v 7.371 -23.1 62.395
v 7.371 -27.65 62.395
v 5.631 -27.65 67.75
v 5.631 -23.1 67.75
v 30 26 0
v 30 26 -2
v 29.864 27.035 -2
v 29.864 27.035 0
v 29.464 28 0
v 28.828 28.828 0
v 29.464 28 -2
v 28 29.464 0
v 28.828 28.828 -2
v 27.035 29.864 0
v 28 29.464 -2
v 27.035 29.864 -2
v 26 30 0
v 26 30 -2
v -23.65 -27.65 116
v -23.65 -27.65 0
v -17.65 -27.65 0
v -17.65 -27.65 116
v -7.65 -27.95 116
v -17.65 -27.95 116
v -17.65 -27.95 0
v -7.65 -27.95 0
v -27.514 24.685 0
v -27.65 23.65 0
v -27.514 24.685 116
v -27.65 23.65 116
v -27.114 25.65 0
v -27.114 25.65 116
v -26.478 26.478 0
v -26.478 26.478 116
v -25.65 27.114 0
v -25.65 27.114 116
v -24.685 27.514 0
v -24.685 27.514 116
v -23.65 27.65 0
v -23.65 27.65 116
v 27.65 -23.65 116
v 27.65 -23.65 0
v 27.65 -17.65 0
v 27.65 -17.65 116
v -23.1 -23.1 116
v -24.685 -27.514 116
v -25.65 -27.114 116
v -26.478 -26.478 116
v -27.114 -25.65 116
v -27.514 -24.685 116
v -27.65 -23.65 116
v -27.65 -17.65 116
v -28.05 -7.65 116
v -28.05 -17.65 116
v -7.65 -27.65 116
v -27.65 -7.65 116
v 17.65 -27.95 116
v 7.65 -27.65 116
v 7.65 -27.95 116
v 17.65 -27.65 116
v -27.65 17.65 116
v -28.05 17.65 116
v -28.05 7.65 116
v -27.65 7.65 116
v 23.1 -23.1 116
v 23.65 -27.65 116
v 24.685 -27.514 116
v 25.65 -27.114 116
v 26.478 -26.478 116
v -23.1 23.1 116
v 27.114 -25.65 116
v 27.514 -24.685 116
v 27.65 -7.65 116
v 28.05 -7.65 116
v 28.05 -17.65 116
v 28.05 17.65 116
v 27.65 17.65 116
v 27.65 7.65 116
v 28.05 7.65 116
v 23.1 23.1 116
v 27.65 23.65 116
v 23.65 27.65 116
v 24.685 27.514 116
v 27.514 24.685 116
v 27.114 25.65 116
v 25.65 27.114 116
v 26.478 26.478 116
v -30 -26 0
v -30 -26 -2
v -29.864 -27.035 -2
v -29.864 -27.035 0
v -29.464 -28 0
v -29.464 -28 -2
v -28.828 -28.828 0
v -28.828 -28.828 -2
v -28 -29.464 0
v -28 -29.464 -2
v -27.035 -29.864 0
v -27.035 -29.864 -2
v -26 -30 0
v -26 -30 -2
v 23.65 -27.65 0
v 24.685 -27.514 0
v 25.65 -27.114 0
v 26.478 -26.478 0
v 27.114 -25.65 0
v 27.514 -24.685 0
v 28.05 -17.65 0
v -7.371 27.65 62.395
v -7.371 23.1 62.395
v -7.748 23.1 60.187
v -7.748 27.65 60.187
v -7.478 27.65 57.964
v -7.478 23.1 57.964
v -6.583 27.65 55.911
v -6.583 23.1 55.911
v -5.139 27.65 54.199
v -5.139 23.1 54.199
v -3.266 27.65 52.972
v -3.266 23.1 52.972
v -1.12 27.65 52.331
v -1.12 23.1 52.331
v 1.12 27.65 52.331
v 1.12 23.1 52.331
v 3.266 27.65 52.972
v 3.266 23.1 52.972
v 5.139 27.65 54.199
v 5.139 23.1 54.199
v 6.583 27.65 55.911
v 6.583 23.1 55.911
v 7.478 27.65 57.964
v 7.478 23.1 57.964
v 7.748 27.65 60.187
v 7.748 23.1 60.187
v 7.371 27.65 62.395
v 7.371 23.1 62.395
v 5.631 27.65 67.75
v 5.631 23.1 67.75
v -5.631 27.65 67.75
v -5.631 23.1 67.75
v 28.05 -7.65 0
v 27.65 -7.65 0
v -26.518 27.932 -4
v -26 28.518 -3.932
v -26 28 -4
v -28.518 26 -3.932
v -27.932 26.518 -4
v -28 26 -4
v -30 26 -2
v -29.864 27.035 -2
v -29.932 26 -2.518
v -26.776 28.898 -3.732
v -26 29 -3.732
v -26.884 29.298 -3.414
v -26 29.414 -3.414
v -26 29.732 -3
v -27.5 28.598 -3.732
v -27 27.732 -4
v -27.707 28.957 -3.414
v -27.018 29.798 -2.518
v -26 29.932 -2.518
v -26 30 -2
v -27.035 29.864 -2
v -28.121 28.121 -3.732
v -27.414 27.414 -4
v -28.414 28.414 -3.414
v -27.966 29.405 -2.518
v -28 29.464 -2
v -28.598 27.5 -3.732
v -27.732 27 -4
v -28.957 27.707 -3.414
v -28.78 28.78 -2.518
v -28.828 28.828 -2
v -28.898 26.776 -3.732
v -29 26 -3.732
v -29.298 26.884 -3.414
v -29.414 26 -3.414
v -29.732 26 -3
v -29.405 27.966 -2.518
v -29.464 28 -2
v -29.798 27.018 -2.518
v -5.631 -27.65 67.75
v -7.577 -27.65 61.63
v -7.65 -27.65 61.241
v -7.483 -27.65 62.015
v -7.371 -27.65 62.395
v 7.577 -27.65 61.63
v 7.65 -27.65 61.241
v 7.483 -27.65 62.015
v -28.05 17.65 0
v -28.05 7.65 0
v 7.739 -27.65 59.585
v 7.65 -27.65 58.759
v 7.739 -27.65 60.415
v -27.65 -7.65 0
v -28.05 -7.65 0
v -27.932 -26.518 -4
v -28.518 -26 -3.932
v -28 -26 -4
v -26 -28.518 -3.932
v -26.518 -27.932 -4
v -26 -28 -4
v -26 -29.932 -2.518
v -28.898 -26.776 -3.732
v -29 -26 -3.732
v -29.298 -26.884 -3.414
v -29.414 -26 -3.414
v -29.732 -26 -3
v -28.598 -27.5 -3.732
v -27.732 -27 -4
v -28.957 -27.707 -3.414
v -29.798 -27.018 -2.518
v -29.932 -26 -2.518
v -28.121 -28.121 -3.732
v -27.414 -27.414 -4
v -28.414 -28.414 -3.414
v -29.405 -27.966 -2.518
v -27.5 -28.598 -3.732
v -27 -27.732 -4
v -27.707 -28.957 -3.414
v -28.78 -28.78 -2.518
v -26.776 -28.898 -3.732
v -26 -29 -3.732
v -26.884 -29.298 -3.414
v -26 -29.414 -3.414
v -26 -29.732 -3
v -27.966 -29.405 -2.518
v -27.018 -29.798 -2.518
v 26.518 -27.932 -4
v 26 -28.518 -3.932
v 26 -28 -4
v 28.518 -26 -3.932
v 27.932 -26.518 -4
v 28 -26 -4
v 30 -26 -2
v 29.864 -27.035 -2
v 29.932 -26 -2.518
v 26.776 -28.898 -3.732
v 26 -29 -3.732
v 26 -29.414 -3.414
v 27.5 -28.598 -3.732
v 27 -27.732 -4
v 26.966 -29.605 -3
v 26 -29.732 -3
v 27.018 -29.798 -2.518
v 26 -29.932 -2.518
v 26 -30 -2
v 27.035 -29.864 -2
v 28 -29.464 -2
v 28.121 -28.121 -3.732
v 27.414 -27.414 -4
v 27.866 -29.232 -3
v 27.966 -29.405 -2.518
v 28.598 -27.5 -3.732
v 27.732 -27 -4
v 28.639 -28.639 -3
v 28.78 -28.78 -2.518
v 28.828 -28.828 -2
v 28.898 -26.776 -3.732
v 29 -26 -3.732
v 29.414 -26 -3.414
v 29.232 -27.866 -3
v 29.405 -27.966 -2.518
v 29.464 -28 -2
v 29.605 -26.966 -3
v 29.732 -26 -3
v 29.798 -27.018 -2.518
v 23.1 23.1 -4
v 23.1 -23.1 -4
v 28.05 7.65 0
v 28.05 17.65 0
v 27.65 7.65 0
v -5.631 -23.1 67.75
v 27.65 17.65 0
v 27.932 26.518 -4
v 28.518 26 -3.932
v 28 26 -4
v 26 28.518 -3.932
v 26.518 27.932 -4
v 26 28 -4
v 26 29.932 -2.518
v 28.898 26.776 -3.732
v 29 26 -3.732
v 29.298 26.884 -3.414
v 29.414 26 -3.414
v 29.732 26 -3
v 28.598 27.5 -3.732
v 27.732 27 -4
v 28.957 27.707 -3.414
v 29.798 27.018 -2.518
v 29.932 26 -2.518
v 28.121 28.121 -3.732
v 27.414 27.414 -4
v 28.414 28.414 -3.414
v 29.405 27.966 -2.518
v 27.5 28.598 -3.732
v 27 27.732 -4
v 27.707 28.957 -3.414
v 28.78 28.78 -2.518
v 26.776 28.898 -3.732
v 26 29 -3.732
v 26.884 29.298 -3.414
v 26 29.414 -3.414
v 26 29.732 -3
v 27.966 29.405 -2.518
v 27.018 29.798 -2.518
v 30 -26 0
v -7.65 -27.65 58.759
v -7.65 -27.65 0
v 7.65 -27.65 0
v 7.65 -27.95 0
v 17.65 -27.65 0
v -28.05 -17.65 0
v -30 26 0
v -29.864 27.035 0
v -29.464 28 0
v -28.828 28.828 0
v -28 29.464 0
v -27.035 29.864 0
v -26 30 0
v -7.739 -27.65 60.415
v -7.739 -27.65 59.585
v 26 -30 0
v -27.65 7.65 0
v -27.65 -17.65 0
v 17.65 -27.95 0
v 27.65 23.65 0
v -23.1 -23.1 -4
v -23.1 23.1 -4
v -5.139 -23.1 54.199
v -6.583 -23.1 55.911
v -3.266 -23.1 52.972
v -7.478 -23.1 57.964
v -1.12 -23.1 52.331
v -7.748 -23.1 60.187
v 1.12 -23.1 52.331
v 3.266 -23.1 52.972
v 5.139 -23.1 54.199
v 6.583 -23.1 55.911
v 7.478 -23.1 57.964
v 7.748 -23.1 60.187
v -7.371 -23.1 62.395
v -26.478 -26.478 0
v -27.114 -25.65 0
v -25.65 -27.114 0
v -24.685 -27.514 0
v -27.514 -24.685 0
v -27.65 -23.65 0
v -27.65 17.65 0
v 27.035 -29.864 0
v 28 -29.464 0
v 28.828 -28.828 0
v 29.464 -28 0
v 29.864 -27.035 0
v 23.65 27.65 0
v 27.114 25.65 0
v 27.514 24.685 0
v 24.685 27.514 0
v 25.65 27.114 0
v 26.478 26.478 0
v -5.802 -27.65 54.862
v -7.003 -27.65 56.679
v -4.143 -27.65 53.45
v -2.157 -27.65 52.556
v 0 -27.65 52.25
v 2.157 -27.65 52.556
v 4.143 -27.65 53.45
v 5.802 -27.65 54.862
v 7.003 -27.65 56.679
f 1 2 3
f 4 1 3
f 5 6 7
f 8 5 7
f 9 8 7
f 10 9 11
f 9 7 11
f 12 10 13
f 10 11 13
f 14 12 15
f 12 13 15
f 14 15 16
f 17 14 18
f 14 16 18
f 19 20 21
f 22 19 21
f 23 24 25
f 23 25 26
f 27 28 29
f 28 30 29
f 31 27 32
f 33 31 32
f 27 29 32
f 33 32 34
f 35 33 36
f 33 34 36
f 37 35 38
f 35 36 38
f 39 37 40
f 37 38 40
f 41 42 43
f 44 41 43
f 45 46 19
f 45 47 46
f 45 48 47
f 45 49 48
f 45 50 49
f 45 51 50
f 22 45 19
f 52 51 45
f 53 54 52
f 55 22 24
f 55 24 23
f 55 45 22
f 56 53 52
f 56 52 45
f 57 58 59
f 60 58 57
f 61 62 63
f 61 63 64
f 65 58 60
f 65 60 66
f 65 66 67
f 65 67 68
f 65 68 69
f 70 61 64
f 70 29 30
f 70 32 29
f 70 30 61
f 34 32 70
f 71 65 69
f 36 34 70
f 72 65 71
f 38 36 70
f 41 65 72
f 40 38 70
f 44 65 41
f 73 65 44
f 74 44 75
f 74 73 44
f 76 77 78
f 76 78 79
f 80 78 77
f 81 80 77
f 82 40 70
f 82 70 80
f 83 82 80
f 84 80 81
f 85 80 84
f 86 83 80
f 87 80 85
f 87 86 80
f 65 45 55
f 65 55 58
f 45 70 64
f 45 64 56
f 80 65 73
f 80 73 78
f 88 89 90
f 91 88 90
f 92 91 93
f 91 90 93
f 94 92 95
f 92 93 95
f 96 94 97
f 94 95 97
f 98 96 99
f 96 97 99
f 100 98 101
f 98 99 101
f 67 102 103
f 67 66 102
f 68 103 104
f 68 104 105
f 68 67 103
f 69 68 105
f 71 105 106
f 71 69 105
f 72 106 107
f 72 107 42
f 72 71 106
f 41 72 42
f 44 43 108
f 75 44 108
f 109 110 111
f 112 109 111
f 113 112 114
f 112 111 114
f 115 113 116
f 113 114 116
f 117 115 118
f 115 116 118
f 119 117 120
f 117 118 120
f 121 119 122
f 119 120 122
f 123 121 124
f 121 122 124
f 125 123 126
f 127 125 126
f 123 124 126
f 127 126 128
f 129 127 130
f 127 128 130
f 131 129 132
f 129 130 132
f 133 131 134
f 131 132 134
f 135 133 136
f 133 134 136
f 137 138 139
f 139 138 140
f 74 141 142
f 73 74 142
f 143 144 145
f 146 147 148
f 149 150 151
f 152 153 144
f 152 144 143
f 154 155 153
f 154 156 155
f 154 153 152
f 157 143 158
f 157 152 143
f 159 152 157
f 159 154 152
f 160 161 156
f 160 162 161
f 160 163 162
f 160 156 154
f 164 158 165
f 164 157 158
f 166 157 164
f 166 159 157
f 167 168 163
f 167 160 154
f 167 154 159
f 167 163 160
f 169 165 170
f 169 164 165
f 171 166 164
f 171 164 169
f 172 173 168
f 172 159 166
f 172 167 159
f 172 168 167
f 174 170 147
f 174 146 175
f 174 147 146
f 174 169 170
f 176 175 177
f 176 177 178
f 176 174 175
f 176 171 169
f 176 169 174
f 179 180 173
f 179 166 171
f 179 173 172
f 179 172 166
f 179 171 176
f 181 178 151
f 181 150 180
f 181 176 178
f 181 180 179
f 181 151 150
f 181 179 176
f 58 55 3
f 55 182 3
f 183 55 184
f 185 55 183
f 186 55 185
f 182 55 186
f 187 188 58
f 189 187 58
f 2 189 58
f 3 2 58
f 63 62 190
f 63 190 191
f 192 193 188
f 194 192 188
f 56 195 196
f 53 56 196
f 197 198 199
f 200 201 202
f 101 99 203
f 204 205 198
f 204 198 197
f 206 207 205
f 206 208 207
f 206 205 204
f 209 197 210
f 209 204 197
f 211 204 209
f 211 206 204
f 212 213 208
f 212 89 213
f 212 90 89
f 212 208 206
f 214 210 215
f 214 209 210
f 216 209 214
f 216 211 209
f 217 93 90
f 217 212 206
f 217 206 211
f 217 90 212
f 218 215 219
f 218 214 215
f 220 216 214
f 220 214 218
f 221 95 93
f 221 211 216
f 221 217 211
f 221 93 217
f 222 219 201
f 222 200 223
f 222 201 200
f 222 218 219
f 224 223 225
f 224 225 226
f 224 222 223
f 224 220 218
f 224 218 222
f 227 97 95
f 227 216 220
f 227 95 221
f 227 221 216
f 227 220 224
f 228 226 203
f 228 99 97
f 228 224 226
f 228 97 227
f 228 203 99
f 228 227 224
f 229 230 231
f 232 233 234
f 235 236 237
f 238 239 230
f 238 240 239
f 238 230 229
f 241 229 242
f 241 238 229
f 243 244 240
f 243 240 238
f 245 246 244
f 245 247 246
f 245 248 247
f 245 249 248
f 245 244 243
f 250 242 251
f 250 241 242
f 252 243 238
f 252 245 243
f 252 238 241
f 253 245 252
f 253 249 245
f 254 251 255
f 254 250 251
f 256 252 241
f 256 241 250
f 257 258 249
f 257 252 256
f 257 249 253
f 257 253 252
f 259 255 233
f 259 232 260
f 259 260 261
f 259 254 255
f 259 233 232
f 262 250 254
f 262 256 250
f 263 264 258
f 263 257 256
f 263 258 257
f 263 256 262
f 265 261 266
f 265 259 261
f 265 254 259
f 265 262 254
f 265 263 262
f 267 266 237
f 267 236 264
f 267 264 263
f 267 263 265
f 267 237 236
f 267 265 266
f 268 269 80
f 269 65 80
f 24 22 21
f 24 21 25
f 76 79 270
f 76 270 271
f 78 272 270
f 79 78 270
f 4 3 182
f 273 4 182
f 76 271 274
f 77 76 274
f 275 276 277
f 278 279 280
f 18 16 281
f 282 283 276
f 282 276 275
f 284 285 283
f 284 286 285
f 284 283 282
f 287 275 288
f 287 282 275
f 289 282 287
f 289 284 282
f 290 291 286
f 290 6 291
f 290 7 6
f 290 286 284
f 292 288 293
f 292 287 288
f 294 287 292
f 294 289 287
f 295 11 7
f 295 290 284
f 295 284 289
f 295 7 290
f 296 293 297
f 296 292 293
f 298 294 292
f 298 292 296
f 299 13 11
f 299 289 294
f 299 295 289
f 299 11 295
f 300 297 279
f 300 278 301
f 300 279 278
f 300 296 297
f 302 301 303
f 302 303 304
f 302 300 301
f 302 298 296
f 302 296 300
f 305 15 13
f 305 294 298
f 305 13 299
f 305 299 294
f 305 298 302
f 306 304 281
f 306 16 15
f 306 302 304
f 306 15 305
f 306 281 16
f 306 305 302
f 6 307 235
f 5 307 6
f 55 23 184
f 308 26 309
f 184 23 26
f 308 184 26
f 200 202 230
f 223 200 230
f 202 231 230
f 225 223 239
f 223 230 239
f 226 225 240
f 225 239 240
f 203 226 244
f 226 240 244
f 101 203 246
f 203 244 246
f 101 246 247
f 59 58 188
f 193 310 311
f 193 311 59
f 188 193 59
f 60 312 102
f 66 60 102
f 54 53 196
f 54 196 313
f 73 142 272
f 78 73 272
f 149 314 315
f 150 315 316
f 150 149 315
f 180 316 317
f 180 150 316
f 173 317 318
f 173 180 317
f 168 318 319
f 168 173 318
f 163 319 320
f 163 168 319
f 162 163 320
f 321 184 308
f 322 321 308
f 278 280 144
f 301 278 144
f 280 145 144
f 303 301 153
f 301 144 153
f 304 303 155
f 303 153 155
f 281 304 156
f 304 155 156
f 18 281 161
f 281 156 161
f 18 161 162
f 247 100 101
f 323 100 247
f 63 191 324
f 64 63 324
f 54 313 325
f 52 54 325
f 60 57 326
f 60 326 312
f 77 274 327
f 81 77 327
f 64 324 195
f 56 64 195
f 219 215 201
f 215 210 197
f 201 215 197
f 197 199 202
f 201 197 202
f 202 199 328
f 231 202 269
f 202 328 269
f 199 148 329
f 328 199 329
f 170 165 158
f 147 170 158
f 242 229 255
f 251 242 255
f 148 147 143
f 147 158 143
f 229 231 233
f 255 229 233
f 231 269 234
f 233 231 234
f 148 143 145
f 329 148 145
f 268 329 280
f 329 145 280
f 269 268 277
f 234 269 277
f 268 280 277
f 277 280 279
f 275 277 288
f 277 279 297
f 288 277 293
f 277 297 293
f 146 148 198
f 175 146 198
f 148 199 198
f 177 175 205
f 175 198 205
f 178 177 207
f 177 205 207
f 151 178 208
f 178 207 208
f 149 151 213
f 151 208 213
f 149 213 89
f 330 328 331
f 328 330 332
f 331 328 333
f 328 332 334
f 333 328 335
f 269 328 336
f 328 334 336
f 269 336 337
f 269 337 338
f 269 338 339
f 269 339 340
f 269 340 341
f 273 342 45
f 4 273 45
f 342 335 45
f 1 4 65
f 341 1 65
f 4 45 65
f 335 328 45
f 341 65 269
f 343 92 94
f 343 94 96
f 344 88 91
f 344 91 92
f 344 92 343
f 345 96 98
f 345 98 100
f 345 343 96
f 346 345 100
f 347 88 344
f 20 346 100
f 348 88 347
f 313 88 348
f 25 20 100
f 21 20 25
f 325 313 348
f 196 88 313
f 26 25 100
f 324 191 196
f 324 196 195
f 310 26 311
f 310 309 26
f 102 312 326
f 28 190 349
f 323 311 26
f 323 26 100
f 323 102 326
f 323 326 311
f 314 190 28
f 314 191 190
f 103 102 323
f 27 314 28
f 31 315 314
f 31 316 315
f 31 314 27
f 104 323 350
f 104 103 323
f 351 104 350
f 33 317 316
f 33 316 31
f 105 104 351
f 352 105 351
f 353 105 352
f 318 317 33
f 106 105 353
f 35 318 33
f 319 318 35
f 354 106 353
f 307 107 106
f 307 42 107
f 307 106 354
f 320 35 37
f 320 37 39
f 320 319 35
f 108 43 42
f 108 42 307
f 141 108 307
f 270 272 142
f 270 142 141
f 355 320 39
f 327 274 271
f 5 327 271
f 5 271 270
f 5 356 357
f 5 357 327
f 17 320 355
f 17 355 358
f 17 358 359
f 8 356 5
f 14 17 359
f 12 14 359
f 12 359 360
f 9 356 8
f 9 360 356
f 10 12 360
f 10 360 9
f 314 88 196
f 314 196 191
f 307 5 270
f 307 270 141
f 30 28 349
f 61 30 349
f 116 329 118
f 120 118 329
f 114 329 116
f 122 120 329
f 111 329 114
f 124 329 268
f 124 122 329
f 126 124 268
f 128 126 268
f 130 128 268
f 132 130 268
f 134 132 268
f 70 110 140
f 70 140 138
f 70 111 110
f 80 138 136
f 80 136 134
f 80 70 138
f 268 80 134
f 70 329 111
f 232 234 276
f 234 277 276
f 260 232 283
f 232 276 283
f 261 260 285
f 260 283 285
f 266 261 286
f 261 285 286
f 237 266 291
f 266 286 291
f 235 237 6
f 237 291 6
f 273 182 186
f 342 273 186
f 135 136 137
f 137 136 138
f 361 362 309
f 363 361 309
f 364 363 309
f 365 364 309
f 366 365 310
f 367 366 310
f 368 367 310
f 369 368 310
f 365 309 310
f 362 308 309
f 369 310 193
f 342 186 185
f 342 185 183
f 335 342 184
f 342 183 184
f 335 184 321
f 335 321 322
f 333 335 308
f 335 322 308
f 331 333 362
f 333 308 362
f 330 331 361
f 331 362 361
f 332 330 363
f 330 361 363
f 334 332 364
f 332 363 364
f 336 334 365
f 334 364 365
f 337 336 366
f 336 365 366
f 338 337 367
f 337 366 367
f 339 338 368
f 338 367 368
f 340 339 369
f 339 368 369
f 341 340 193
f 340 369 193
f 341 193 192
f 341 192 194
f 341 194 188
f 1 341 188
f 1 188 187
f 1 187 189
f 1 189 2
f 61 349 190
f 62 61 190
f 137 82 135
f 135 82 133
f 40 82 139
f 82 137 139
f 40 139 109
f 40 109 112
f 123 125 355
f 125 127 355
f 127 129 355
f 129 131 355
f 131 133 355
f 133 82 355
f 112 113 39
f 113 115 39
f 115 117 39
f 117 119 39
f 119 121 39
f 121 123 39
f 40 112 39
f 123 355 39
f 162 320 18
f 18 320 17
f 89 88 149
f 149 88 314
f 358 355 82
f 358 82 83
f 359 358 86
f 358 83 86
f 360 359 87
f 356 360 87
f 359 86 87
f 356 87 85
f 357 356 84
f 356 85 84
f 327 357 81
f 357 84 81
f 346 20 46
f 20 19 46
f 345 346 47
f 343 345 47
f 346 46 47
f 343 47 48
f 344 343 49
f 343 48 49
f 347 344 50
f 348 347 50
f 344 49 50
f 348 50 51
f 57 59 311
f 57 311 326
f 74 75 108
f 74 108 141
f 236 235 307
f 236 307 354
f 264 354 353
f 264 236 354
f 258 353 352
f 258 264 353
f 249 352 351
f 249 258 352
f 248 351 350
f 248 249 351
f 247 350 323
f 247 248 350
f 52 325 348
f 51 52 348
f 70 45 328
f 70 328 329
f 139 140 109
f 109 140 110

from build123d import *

# Parameters (mm, degrees)
F0_W     = 46.2
F0_H     = 46.2
F1_DEPTH = 116
F0_W_2   = 60
F0_H_2   = 60
F2_DEPTH = 4
F3_R     = 4
F4_R     = 2
F7_DEPTH = 80


with BuildPart() as f1:
    # F0 (on Top) → F1 (new body)
    with BuildSketch(Plane.XY):
        Polygon((27.65, 17.65), (27.65, 27.65), (-27.65, 27.65), (-27.65, 17.65), (-28.05, 17.65), (-28.05, 7.65), (-27.65, 7.65), (-27.65, -7.65), (-28.05, -7.65), (-28.05, -17.65), (-27.65, -17.65), (-27.65, -27.65), (-17.65, -27.65), (-17.65, -27.95), (-7.65, -27.95), (-7.65, -27.65), (7.65, -27.65), (7.65, -27.95), (17.65, -27.95), (17.65, -27.65), (27.65, -27.65), (27.65, -17.65), (28.05, -17.65), (28.05, -7.65), (27.65, -7.65), (27.65, 7.65), (28.05, 7.65), (28.05, 17.65), align=None)
        Rectangle(F0_W, F0_H, mode=Mode.SUBTRACT)
    extrude(amount=F1_DEPTH)

    # F0 (on Top) → F2 (join)
    with BuildSketch(Plane.XY):
        Rectangle(F0_W_2, F0_H_2)
        Polygon((-27.65, 27.65), (27.65, 27.65), (27.65, 17.65), (28.05, 17.65), (28.05, 7.65), (27.65, 7.65), (27.65, -7.65), (28.05, -7.65), (28.05, -17.65), (27.65, -17.65), (27.65, -27.65), (17.65, -27.65), (17.65, -27.95), (7.65, -27.95), (7.65, -27.65), (-7.65, -27.65), (-7.65, -27.95), (-17.65, -27.95), (-17.65, -27.65), (-27.65, -27.65), (-27.65, -17.65), (-28.05, -17.65), (-28.05, -7.65), (-27.65, -7.65), (-27.65, 7.65), (-28.05, 7.65), (-28.05, 17.65), (-27.65, 17.65), align=None, mode=Mode.SUBTRACT)
        Polygon((27.65, 17.65), (27.65, 27.65), (-27.65, 27.65), (-27.65, 17.65), (-28.05, 17.65), (-28.05, 7.65), (-27.65, 7.65), (-27.65, -7.65), (-28.05, -7.65), (-28.05, -17.65), (-27.65, -17.65), (-27.65, -27.65), (-17.65, -27.65), (-17.65, -27.95), (-7.65, -27.95), (-7.65, -27.65), (7.65, -27.65), (7.65, -27.95), (17.65, -27.95), (17.65, -27.65), (27.65, -27.65), (27.65, -17.65), (28.05, -17.65), (28.05, -7.65), (27.65, -7.65), (27.65, 7.65), (28.05, 7.65), (28.05, 17.65), align=None)
        Rectangle(F0_W, F0_H, mode=Mode.SUBTRACT)
    extrude(amount=-F2_DEPTH)

    # F3
    f3_edges = [f1.edges().sort_by_distance(p)[0] for p in [
        (27.65, -27.65, 58),
        (-27.65, -27.65, 58),
        (27.65, 27.65, 58),
        (-27.65, 27.65, 58),
        (-30, 30, -2),
        (30, 30, -2),
        (-30, -30, -2),
        (30, -30, -2),
    ]]
    fillet(f3_edges, radius=F3_R)

    # F4
    f4_edges = [f1.edges().sort_by_distance(p)[0] for p in [
        (30, 0, -4),
    ]]
    fillet(f4_edges, radius=F4_R)

    # F6 (on offset) → F7 (cut)
    with BuildSketch(Plane.XZ.offset(27.65)):
        with BuildLine():
            Line((-5.630705, 67.75), (-7.370688, 62.394882))
            ThreePointArc((-7.370688, 62.394882), (0, 52.25), (7.370688, 62.394882))
            Line((7.370688, 62.394882), (5.630705, 67.75))
            Line((5.630705, 67.75), (-5.630705, 67.75))
        make_face()
    extrude(amount=-F7_DEPTH, mode=Mode.SUBTRACT)


solid = f1.part
